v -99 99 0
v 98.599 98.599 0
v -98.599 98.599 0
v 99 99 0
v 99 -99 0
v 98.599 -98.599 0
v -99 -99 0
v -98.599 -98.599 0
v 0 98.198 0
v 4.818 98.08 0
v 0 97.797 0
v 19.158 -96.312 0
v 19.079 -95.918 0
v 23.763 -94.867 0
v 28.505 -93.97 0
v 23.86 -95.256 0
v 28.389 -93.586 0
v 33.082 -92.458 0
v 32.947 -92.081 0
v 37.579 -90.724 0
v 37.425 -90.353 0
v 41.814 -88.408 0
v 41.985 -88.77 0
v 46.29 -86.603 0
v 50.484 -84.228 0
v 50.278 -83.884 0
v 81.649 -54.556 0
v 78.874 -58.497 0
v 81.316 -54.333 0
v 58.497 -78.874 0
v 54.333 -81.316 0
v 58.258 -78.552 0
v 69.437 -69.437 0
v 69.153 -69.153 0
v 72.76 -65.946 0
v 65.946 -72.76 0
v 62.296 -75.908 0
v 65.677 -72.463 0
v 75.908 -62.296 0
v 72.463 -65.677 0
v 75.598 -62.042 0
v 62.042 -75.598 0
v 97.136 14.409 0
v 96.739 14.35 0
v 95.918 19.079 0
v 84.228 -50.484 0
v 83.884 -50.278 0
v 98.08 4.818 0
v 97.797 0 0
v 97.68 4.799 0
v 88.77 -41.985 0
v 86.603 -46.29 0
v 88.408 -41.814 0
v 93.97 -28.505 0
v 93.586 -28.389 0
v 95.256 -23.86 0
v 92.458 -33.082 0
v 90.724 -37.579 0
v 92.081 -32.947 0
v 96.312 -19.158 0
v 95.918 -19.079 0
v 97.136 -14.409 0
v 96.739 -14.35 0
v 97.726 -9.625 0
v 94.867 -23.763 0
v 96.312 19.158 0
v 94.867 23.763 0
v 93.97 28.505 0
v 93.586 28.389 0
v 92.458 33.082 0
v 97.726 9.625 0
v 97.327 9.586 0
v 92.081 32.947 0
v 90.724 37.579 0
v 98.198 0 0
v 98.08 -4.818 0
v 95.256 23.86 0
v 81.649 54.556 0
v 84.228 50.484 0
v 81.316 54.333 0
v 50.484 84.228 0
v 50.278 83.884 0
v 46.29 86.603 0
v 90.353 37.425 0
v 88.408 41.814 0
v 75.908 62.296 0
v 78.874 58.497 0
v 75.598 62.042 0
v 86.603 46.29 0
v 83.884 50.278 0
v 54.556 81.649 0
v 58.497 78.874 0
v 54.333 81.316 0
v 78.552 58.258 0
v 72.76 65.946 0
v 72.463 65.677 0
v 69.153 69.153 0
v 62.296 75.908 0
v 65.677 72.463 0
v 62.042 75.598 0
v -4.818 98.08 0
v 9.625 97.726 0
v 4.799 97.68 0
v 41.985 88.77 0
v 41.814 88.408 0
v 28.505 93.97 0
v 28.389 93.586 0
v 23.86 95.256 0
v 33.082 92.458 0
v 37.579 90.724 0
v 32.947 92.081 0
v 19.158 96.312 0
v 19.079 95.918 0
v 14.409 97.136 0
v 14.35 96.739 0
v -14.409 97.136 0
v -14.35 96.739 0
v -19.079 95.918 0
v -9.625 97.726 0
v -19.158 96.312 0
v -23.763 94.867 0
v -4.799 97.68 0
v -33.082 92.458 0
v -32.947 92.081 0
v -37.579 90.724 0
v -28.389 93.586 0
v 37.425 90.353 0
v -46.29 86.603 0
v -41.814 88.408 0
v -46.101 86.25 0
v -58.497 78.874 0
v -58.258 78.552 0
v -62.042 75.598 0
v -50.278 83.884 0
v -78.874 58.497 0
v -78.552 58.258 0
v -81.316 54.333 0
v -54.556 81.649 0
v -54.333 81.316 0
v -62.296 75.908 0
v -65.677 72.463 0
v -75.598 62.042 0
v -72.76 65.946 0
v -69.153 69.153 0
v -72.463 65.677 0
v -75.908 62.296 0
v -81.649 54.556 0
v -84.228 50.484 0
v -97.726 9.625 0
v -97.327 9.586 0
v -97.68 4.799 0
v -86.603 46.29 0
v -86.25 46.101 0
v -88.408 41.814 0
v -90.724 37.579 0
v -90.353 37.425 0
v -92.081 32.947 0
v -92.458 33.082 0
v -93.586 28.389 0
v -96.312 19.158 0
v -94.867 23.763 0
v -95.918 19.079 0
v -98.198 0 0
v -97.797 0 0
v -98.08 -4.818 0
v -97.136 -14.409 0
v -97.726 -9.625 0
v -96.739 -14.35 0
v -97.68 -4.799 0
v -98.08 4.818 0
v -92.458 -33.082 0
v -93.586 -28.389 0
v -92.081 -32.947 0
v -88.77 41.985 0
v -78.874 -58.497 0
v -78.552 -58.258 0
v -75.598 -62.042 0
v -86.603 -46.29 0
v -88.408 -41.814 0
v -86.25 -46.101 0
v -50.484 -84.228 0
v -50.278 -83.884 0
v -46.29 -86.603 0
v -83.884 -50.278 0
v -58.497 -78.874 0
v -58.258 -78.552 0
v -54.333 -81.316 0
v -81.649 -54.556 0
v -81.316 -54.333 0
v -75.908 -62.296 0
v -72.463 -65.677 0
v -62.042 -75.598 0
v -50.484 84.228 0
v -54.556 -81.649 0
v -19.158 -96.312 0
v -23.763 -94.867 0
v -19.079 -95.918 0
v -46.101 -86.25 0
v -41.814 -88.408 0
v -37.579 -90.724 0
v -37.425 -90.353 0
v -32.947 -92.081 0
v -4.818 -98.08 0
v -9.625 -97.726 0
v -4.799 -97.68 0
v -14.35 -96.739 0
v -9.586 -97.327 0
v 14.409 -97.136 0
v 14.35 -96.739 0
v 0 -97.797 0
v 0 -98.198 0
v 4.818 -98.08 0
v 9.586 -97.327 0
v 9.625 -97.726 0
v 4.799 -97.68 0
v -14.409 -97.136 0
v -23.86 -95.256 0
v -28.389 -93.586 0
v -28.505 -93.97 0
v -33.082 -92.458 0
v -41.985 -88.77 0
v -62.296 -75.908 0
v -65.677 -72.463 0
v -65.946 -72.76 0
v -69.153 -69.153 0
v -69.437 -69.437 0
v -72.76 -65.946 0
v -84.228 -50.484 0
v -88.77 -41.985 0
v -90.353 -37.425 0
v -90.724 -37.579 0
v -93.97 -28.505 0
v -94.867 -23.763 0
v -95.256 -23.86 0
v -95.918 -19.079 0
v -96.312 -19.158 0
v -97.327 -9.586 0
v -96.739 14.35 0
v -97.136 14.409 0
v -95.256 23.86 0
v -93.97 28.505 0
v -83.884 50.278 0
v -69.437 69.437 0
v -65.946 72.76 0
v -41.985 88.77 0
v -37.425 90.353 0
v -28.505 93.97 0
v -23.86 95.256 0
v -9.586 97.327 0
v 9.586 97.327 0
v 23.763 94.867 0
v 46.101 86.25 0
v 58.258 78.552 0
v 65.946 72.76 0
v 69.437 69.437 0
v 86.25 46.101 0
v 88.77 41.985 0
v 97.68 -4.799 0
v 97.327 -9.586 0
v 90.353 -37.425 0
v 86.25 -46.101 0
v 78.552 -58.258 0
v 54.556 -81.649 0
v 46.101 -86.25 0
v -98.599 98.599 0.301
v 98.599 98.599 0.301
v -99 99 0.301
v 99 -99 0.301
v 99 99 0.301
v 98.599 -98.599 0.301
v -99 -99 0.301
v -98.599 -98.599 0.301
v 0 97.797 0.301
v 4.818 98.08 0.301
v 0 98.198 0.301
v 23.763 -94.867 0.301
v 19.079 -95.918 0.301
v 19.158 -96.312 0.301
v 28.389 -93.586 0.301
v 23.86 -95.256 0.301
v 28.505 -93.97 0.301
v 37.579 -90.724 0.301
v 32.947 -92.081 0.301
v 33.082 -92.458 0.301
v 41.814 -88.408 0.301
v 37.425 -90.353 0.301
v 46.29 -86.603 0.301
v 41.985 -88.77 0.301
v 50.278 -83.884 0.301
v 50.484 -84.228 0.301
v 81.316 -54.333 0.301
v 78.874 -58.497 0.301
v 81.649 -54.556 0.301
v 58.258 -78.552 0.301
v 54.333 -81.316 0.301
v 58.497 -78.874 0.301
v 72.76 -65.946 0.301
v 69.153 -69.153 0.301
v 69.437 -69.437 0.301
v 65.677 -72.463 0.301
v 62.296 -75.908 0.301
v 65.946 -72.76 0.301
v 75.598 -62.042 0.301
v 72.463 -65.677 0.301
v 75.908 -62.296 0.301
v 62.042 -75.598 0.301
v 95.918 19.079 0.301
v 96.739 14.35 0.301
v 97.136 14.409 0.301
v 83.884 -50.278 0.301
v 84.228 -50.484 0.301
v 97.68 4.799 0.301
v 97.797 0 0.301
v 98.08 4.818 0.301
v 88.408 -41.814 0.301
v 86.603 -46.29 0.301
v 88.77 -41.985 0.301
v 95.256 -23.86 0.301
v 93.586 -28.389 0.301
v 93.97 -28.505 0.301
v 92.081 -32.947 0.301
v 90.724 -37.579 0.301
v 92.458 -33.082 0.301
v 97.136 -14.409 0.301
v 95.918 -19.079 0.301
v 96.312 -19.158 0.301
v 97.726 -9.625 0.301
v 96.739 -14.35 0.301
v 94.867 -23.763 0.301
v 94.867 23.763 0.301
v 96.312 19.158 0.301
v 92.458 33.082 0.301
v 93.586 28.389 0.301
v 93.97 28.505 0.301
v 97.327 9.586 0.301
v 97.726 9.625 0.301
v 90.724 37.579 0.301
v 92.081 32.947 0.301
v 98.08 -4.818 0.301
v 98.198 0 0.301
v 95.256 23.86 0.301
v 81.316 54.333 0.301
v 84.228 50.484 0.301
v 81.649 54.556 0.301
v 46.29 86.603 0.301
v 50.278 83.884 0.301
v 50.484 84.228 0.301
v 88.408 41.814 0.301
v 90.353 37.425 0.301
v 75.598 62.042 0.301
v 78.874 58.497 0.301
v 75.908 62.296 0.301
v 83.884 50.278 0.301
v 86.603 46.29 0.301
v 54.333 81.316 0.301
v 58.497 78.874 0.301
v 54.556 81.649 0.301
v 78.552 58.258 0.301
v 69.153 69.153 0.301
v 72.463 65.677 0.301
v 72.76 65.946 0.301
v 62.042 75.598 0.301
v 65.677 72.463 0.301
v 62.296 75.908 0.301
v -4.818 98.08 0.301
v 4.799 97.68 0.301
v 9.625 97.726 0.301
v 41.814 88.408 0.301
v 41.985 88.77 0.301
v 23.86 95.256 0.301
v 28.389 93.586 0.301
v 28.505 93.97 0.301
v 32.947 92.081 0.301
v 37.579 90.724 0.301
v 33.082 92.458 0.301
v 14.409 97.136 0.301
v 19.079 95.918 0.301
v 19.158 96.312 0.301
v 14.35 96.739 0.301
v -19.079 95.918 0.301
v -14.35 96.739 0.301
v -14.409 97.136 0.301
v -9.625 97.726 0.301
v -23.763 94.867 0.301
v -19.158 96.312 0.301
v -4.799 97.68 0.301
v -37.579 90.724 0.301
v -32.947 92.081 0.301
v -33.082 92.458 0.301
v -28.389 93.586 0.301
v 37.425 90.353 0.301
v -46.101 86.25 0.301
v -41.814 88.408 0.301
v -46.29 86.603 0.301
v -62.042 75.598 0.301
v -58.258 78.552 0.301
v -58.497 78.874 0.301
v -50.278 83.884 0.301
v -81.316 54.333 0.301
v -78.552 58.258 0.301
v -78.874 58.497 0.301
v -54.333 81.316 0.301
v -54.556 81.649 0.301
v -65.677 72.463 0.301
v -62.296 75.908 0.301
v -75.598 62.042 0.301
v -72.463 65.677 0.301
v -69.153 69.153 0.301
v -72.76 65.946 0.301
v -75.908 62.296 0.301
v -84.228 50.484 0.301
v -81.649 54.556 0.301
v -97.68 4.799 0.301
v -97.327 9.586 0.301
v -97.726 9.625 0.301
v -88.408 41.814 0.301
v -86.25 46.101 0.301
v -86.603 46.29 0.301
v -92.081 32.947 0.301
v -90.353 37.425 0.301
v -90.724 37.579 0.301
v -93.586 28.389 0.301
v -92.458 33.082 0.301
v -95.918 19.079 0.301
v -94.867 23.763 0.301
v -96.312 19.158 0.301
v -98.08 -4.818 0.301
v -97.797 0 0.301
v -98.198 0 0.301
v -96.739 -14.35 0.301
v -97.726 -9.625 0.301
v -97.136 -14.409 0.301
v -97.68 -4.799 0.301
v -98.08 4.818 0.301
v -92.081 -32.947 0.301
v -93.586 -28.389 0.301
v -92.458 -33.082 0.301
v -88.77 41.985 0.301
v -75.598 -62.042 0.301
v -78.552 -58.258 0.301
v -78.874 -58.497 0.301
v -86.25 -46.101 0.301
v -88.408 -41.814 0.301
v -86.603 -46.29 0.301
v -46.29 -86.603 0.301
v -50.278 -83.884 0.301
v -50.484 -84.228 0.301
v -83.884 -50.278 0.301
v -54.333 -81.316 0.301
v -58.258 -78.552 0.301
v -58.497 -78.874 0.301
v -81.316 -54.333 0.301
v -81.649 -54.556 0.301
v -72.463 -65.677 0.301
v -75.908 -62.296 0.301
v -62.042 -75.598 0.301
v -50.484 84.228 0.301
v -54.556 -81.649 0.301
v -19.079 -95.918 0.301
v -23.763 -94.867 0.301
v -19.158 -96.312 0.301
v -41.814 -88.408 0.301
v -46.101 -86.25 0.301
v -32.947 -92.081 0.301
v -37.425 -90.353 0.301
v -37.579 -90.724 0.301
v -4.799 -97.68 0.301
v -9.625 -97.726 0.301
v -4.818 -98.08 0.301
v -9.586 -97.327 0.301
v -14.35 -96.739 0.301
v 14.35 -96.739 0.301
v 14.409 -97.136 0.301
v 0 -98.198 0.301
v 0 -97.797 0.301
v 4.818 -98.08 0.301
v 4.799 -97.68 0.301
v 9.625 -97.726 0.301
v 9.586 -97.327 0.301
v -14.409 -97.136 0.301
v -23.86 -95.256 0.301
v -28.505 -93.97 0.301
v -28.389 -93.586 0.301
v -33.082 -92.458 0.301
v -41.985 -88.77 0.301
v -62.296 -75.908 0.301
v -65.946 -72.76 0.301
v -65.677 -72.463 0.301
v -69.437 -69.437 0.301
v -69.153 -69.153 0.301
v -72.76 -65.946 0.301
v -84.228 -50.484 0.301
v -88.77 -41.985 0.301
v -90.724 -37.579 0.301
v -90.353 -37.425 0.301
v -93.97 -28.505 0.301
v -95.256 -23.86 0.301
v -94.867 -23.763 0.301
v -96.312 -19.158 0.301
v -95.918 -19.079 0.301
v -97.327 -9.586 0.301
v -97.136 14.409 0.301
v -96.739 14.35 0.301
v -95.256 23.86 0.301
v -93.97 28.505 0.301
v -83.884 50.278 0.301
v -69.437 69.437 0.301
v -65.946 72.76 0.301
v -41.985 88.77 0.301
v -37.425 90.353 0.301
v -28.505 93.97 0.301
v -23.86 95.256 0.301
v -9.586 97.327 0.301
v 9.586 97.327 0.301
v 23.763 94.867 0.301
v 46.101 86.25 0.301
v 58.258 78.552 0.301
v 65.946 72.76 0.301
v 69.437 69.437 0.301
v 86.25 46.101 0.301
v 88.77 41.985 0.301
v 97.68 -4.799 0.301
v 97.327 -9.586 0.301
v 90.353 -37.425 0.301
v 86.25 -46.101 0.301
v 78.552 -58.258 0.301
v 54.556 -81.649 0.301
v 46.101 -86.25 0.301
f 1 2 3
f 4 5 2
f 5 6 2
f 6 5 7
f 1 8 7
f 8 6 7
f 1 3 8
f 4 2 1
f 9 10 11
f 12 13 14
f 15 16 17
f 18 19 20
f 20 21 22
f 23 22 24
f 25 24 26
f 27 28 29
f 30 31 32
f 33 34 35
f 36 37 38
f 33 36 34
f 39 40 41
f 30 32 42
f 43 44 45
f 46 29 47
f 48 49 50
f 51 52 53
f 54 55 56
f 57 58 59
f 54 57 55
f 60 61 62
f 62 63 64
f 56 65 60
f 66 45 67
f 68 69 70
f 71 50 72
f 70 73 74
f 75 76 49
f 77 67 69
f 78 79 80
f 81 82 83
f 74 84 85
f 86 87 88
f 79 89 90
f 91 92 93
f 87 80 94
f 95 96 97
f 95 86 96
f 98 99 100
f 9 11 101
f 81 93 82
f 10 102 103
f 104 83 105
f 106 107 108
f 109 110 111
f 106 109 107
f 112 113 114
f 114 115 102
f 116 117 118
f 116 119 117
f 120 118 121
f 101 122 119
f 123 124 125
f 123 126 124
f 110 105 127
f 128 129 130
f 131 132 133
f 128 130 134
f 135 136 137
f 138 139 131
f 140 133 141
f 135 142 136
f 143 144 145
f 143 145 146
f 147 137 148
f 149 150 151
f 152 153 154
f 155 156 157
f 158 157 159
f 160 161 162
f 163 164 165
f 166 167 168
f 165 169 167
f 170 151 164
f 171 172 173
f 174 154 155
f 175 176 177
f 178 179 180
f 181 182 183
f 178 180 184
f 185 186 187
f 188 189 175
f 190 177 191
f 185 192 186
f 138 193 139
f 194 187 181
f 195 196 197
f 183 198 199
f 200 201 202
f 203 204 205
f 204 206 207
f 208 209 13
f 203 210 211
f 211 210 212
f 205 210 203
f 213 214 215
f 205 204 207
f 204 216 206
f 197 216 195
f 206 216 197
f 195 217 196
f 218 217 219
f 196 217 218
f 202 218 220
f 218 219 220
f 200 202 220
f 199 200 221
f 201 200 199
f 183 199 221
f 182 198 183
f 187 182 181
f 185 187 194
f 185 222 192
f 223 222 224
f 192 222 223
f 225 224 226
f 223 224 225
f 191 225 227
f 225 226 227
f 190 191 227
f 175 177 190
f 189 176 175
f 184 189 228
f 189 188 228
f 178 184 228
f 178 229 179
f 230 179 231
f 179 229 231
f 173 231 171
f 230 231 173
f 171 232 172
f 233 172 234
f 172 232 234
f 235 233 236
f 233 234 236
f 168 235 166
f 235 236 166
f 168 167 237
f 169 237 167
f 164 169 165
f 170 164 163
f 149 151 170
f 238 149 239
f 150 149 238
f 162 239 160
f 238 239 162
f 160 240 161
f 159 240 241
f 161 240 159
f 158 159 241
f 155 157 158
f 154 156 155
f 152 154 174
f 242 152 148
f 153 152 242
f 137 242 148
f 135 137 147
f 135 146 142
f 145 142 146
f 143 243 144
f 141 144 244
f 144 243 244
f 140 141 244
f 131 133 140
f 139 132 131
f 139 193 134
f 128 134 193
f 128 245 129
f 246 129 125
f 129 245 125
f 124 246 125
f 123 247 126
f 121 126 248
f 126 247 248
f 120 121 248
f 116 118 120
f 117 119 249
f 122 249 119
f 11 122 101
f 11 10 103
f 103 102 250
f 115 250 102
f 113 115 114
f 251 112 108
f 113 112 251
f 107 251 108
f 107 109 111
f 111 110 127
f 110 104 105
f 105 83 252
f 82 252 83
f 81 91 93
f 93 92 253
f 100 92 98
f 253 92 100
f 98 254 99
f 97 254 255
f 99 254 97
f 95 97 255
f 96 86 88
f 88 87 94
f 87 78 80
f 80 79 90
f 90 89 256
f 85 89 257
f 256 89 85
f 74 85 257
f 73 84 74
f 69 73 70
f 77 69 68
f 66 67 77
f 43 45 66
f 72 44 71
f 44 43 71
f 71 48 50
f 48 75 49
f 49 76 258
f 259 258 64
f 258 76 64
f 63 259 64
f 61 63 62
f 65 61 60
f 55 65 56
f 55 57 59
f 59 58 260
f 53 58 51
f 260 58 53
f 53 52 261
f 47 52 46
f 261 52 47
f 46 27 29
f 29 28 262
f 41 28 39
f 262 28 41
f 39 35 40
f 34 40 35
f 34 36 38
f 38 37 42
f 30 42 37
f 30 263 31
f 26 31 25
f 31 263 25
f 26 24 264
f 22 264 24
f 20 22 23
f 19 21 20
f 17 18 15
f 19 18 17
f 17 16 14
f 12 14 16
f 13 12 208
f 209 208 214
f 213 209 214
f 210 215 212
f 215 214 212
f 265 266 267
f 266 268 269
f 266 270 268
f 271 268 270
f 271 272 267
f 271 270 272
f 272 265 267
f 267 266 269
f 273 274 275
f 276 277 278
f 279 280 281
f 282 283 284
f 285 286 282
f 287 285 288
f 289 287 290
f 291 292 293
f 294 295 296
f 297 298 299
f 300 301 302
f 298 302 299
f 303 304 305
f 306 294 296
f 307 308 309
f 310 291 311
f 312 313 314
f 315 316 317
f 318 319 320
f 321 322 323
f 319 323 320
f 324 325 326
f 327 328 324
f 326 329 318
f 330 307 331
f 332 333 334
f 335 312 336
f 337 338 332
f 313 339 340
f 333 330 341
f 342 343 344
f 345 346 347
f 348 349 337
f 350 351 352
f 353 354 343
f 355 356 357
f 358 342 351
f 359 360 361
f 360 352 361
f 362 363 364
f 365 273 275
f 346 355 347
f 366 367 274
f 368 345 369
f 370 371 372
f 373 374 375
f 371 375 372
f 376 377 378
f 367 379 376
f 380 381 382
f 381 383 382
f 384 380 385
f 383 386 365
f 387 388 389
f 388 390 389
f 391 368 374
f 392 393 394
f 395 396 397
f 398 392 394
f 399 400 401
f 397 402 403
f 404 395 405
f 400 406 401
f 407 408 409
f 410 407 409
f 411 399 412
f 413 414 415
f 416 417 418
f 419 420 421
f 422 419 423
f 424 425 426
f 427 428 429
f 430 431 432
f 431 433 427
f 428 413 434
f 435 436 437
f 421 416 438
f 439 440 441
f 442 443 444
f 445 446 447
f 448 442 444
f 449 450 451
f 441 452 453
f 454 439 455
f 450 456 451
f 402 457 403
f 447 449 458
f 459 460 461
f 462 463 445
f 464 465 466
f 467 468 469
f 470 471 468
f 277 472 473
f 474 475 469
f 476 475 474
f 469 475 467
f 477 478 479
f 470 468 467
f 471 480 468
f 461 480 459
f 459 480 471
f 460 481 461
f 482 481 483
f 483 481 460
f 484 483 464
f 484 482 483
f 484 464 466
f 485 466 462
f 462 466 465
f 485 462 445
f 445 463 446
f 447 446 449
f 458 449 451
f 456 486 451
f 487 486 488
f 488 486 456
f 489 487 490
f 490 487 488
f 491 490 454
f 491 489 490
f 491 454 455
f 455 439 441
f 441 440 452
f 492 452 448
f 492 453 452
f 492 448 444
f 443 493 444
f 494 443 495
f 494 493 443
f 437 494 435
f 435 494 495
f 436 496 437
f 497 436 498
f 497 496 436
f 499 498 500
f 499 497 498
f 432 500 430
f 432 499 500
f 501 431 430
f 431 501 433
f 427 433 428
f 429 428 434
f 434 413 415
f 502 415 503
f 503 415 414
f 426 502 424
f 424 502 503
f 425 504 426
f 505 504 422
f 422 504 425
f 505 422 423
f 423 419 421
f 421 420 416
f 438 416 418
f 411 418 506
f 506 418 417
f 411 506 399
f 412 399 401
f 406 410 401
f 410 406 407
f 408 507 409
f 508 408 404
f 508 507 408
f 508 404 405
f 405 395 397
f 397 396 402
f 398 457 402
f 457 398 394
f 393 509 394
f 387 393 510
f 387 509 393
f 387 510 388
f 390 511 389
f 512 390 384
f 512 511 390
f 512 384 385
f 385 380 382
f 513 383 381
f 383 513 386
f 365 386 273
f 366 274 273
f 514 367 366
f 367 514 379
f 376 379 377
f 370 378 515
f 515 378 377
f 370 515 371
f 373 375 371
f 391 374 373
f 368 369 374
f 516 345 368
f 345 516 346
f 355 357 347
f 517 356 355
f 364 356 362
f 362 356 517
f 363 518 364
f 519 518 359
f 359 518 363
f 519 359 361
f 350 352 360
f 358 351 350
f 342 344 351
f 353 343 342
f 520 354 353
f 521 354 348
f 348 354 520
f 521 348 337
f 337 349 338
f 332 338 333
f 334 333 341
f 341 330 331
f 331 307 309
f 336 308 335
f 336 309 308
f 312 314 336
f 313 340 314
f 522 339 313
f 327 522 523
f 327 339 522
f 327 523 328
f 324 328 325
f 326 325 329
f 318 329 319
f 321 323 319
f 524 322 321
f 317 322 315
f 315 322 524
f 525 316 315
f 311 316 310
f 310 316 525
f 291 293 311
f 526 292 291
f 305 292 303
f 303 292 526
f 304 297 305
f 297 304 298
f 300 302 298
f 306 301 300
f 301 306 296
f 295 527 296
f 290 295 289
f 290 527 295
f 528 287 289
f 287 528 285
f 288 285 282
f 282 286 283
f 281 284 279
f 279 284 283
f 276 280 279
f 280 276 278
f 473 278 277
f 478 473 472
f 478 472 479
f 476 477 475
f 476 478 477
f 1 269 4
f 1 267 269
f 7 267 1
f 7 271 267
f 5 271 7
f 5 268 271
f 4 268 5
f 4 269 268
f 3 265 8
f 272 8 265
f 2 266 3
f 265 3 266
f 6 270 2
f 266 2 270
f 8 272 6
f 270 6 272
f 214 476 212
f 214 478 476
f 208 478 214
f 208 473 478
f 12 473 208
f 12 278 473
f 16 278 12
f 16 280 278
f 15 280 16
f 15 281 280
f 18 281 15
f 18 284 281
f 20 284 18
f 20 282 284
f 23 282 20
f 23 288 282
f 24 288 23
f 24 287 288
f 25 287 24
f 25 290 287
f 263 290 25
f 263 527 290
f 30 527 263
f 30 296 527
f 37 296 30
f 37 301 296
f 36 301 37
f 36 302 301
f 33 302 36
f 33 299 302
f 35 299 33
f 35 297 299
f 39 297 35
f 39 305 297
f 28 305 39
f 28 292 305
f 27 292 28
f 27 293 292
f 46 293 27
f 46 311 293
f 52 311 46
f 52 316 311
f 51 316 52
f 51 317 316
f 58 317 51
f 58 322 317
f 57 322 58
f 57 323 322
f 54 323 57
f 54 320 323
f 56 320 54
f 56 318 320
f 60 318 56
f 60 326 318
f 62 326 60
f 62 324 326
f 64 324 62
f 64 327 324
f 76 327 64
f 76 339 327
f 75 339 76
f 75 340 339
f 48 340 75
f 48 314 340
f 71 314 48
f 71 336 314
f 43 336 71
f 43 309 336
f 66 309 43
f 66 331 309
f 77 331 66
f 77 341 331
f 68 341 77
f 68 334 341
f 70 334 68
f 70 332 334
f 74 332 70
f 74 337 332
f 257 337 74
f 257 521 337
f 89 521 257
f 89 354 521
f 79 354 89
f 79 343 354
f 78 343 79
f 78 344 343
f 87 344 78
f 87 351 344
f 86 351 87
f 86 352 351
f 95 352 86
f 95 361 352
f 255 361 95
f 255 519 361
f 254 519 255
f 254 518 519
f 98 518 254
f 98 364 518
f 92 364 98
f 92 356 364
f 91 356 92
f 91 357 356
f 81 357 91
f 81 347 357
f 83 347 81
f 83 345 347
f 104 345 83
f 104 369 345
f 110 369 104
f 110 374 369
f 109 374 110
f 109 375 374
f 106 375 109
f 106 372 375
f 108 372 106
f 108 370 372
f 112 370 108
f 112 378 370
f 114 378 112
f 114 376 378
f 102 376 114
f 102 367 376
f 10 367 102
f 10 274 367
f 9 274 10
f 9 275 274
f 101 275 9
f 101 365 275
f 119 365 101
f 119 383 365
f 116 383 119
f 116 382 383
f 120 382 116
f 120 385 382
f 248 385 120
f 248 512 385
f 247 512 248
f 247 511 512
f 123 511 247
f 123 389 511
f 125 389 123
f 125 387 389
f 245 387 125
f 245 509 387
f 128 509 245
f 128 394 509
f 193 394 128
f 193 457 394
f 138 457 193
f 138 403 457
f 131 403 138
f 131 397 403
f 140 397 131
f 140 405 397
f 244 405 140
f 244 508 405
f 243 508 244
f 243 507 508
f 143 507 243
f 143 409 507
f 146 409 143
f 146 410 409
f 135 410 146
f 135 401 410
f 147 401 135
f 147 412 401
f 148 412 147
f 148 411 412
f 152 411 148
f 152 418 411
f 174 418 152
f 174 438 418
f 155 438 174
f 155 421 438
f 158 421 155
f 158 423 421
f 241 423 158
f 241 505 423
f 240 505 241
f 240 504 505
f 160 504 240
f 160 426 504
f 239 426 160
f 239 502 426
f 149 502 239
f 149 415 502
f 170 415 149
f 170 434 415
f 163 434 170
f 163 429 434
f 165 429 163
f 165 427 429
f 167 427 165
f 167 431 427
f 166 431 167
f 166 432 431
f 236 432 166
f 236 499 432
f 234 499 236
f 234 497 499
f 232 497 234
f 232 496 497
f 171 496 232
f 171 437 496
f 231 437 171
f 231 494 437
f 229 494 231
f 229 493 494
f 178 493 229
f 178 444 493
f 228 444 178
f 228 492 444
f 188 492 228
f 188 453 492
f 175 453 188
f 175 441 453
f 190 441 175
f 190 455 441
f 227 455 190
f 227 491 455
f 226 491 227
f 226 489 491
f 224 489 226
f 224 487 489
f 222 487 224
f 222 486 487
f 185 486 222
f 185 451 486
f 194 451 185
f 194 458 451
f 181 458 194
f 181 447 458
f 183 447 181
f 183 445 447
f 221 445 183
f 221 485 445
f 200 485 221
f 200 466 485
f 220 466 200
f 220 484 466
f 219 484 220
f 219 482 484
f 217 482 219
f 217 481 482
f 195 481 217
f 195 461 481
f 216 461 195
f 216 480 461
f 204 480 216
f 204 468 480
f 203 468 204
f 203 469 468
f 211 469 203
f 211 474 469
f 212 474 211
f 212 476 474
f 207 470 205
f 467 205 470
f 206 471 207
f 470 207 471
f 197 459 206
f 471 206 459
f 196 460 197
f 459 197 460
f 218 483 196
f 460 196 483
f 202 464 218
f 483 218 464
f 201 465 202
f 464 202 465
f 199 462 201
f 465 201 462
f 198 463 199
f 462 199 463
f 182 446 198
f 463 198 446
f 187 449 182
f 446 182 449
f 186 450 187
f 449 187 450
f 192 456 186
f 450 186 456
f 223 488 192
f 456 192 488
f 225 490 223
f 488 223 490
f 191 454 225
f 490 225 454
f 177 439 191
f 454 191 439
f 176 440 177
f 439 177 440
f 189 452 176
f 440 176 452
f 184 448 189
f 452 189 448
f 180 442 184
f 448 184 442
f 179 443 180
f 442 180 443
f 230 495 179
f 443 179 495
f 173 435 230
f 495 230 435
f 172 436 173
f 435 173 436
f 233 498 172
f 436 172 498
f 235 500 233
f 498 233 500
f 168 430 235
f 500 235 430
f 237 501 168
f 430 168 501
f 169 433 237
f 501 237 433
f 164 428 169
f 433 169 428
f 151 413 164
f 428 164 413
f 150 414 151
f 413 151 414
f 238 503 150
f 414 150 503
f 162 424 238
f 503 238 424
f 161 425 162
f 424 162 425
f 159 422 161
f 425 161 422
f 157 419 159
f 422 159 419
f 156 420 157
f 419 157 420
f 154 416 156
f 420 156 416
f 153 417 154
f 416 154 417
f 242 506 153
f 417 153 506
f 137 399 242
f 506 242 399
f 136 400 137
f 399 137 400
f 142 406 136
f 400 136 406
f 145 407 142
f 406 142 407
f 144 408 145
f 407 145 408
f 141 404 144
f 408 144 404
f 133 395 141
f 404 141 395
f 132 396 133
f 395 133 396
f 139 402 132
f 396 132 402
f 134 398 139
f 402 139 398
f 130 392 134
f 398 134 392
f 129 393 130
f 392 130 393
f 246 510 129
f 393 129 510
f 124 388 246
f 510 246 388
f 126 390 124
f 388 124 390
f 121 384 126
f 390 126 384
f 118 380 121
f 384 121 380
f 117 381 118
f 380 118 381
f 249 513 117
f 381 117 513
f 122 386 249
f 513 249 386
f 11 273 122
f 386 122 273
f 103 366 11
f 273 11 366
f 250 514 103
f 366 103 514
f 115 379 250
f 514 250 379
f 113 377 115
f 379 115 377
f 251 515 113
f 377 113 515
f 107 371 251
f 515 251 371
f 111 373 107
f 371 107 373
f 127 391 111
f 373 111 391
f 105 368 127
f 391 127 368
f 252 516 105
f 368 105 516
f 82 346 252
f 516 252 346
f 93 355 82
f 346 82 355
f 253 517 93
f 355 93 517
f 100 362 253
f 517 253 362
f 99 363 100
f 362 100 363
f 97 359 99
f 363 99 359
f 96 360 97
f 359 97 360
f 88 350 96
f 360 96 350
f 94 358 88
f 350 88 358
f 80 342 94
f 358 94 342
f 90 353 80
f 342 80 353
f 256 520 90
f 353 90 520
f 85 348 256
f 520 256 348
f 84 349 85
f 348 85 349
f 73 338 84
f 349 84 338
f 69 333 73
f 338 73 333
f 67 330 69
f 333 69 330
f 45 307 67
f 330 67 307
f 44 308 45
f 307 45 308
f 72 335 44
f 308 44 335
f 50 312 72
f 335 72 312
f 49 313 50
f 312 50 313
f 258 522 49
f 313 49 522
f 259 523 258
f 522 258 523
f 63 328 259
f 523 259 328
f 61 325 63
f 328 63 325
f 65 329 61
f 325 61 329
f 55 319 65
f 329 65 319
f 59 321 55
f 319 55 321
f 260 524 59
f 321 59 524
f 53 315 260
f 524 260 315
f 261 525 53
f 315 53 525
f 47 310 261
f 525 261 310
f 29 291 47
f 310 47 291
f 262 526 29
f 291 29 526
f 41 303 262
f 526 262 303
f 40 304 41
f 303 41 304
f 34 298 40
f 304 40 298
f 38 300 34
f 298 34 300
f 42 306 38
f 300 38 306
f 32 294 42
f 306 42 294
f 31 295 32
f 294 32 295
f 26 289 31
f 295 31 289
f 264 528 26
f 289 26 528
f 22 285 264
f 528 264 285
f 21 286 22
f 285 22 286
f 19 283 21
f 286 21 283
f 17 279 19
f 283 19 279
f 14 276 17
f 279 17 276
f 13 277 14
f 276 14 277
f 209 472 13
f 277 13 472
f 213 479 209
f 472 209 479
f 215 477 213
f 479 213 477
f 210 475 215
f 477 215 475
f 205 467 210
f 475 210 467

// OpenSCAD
// Circle in square bed level pattern
// A circle inside a square outline, across 90% of a 220 x 220 mm bed.

include <../../src/bedlevelpattern.scad>;

// Parameters
bed_level_pattern_type = "circle in square";
print_area_width = 220.001;
print_area_depth = 220.001;
line_width = 0.401;
line_height = 0.301;
fill_percentage = 90; // Range: [50:100]
quality_value = 128;

$fn = quality_value;

// Generate the pattern
generate_bed_level_pattern(
  bed_level_pattern_type, print_area_width, print_area_depth, line_width, line_height,
  fill_percentage
);
